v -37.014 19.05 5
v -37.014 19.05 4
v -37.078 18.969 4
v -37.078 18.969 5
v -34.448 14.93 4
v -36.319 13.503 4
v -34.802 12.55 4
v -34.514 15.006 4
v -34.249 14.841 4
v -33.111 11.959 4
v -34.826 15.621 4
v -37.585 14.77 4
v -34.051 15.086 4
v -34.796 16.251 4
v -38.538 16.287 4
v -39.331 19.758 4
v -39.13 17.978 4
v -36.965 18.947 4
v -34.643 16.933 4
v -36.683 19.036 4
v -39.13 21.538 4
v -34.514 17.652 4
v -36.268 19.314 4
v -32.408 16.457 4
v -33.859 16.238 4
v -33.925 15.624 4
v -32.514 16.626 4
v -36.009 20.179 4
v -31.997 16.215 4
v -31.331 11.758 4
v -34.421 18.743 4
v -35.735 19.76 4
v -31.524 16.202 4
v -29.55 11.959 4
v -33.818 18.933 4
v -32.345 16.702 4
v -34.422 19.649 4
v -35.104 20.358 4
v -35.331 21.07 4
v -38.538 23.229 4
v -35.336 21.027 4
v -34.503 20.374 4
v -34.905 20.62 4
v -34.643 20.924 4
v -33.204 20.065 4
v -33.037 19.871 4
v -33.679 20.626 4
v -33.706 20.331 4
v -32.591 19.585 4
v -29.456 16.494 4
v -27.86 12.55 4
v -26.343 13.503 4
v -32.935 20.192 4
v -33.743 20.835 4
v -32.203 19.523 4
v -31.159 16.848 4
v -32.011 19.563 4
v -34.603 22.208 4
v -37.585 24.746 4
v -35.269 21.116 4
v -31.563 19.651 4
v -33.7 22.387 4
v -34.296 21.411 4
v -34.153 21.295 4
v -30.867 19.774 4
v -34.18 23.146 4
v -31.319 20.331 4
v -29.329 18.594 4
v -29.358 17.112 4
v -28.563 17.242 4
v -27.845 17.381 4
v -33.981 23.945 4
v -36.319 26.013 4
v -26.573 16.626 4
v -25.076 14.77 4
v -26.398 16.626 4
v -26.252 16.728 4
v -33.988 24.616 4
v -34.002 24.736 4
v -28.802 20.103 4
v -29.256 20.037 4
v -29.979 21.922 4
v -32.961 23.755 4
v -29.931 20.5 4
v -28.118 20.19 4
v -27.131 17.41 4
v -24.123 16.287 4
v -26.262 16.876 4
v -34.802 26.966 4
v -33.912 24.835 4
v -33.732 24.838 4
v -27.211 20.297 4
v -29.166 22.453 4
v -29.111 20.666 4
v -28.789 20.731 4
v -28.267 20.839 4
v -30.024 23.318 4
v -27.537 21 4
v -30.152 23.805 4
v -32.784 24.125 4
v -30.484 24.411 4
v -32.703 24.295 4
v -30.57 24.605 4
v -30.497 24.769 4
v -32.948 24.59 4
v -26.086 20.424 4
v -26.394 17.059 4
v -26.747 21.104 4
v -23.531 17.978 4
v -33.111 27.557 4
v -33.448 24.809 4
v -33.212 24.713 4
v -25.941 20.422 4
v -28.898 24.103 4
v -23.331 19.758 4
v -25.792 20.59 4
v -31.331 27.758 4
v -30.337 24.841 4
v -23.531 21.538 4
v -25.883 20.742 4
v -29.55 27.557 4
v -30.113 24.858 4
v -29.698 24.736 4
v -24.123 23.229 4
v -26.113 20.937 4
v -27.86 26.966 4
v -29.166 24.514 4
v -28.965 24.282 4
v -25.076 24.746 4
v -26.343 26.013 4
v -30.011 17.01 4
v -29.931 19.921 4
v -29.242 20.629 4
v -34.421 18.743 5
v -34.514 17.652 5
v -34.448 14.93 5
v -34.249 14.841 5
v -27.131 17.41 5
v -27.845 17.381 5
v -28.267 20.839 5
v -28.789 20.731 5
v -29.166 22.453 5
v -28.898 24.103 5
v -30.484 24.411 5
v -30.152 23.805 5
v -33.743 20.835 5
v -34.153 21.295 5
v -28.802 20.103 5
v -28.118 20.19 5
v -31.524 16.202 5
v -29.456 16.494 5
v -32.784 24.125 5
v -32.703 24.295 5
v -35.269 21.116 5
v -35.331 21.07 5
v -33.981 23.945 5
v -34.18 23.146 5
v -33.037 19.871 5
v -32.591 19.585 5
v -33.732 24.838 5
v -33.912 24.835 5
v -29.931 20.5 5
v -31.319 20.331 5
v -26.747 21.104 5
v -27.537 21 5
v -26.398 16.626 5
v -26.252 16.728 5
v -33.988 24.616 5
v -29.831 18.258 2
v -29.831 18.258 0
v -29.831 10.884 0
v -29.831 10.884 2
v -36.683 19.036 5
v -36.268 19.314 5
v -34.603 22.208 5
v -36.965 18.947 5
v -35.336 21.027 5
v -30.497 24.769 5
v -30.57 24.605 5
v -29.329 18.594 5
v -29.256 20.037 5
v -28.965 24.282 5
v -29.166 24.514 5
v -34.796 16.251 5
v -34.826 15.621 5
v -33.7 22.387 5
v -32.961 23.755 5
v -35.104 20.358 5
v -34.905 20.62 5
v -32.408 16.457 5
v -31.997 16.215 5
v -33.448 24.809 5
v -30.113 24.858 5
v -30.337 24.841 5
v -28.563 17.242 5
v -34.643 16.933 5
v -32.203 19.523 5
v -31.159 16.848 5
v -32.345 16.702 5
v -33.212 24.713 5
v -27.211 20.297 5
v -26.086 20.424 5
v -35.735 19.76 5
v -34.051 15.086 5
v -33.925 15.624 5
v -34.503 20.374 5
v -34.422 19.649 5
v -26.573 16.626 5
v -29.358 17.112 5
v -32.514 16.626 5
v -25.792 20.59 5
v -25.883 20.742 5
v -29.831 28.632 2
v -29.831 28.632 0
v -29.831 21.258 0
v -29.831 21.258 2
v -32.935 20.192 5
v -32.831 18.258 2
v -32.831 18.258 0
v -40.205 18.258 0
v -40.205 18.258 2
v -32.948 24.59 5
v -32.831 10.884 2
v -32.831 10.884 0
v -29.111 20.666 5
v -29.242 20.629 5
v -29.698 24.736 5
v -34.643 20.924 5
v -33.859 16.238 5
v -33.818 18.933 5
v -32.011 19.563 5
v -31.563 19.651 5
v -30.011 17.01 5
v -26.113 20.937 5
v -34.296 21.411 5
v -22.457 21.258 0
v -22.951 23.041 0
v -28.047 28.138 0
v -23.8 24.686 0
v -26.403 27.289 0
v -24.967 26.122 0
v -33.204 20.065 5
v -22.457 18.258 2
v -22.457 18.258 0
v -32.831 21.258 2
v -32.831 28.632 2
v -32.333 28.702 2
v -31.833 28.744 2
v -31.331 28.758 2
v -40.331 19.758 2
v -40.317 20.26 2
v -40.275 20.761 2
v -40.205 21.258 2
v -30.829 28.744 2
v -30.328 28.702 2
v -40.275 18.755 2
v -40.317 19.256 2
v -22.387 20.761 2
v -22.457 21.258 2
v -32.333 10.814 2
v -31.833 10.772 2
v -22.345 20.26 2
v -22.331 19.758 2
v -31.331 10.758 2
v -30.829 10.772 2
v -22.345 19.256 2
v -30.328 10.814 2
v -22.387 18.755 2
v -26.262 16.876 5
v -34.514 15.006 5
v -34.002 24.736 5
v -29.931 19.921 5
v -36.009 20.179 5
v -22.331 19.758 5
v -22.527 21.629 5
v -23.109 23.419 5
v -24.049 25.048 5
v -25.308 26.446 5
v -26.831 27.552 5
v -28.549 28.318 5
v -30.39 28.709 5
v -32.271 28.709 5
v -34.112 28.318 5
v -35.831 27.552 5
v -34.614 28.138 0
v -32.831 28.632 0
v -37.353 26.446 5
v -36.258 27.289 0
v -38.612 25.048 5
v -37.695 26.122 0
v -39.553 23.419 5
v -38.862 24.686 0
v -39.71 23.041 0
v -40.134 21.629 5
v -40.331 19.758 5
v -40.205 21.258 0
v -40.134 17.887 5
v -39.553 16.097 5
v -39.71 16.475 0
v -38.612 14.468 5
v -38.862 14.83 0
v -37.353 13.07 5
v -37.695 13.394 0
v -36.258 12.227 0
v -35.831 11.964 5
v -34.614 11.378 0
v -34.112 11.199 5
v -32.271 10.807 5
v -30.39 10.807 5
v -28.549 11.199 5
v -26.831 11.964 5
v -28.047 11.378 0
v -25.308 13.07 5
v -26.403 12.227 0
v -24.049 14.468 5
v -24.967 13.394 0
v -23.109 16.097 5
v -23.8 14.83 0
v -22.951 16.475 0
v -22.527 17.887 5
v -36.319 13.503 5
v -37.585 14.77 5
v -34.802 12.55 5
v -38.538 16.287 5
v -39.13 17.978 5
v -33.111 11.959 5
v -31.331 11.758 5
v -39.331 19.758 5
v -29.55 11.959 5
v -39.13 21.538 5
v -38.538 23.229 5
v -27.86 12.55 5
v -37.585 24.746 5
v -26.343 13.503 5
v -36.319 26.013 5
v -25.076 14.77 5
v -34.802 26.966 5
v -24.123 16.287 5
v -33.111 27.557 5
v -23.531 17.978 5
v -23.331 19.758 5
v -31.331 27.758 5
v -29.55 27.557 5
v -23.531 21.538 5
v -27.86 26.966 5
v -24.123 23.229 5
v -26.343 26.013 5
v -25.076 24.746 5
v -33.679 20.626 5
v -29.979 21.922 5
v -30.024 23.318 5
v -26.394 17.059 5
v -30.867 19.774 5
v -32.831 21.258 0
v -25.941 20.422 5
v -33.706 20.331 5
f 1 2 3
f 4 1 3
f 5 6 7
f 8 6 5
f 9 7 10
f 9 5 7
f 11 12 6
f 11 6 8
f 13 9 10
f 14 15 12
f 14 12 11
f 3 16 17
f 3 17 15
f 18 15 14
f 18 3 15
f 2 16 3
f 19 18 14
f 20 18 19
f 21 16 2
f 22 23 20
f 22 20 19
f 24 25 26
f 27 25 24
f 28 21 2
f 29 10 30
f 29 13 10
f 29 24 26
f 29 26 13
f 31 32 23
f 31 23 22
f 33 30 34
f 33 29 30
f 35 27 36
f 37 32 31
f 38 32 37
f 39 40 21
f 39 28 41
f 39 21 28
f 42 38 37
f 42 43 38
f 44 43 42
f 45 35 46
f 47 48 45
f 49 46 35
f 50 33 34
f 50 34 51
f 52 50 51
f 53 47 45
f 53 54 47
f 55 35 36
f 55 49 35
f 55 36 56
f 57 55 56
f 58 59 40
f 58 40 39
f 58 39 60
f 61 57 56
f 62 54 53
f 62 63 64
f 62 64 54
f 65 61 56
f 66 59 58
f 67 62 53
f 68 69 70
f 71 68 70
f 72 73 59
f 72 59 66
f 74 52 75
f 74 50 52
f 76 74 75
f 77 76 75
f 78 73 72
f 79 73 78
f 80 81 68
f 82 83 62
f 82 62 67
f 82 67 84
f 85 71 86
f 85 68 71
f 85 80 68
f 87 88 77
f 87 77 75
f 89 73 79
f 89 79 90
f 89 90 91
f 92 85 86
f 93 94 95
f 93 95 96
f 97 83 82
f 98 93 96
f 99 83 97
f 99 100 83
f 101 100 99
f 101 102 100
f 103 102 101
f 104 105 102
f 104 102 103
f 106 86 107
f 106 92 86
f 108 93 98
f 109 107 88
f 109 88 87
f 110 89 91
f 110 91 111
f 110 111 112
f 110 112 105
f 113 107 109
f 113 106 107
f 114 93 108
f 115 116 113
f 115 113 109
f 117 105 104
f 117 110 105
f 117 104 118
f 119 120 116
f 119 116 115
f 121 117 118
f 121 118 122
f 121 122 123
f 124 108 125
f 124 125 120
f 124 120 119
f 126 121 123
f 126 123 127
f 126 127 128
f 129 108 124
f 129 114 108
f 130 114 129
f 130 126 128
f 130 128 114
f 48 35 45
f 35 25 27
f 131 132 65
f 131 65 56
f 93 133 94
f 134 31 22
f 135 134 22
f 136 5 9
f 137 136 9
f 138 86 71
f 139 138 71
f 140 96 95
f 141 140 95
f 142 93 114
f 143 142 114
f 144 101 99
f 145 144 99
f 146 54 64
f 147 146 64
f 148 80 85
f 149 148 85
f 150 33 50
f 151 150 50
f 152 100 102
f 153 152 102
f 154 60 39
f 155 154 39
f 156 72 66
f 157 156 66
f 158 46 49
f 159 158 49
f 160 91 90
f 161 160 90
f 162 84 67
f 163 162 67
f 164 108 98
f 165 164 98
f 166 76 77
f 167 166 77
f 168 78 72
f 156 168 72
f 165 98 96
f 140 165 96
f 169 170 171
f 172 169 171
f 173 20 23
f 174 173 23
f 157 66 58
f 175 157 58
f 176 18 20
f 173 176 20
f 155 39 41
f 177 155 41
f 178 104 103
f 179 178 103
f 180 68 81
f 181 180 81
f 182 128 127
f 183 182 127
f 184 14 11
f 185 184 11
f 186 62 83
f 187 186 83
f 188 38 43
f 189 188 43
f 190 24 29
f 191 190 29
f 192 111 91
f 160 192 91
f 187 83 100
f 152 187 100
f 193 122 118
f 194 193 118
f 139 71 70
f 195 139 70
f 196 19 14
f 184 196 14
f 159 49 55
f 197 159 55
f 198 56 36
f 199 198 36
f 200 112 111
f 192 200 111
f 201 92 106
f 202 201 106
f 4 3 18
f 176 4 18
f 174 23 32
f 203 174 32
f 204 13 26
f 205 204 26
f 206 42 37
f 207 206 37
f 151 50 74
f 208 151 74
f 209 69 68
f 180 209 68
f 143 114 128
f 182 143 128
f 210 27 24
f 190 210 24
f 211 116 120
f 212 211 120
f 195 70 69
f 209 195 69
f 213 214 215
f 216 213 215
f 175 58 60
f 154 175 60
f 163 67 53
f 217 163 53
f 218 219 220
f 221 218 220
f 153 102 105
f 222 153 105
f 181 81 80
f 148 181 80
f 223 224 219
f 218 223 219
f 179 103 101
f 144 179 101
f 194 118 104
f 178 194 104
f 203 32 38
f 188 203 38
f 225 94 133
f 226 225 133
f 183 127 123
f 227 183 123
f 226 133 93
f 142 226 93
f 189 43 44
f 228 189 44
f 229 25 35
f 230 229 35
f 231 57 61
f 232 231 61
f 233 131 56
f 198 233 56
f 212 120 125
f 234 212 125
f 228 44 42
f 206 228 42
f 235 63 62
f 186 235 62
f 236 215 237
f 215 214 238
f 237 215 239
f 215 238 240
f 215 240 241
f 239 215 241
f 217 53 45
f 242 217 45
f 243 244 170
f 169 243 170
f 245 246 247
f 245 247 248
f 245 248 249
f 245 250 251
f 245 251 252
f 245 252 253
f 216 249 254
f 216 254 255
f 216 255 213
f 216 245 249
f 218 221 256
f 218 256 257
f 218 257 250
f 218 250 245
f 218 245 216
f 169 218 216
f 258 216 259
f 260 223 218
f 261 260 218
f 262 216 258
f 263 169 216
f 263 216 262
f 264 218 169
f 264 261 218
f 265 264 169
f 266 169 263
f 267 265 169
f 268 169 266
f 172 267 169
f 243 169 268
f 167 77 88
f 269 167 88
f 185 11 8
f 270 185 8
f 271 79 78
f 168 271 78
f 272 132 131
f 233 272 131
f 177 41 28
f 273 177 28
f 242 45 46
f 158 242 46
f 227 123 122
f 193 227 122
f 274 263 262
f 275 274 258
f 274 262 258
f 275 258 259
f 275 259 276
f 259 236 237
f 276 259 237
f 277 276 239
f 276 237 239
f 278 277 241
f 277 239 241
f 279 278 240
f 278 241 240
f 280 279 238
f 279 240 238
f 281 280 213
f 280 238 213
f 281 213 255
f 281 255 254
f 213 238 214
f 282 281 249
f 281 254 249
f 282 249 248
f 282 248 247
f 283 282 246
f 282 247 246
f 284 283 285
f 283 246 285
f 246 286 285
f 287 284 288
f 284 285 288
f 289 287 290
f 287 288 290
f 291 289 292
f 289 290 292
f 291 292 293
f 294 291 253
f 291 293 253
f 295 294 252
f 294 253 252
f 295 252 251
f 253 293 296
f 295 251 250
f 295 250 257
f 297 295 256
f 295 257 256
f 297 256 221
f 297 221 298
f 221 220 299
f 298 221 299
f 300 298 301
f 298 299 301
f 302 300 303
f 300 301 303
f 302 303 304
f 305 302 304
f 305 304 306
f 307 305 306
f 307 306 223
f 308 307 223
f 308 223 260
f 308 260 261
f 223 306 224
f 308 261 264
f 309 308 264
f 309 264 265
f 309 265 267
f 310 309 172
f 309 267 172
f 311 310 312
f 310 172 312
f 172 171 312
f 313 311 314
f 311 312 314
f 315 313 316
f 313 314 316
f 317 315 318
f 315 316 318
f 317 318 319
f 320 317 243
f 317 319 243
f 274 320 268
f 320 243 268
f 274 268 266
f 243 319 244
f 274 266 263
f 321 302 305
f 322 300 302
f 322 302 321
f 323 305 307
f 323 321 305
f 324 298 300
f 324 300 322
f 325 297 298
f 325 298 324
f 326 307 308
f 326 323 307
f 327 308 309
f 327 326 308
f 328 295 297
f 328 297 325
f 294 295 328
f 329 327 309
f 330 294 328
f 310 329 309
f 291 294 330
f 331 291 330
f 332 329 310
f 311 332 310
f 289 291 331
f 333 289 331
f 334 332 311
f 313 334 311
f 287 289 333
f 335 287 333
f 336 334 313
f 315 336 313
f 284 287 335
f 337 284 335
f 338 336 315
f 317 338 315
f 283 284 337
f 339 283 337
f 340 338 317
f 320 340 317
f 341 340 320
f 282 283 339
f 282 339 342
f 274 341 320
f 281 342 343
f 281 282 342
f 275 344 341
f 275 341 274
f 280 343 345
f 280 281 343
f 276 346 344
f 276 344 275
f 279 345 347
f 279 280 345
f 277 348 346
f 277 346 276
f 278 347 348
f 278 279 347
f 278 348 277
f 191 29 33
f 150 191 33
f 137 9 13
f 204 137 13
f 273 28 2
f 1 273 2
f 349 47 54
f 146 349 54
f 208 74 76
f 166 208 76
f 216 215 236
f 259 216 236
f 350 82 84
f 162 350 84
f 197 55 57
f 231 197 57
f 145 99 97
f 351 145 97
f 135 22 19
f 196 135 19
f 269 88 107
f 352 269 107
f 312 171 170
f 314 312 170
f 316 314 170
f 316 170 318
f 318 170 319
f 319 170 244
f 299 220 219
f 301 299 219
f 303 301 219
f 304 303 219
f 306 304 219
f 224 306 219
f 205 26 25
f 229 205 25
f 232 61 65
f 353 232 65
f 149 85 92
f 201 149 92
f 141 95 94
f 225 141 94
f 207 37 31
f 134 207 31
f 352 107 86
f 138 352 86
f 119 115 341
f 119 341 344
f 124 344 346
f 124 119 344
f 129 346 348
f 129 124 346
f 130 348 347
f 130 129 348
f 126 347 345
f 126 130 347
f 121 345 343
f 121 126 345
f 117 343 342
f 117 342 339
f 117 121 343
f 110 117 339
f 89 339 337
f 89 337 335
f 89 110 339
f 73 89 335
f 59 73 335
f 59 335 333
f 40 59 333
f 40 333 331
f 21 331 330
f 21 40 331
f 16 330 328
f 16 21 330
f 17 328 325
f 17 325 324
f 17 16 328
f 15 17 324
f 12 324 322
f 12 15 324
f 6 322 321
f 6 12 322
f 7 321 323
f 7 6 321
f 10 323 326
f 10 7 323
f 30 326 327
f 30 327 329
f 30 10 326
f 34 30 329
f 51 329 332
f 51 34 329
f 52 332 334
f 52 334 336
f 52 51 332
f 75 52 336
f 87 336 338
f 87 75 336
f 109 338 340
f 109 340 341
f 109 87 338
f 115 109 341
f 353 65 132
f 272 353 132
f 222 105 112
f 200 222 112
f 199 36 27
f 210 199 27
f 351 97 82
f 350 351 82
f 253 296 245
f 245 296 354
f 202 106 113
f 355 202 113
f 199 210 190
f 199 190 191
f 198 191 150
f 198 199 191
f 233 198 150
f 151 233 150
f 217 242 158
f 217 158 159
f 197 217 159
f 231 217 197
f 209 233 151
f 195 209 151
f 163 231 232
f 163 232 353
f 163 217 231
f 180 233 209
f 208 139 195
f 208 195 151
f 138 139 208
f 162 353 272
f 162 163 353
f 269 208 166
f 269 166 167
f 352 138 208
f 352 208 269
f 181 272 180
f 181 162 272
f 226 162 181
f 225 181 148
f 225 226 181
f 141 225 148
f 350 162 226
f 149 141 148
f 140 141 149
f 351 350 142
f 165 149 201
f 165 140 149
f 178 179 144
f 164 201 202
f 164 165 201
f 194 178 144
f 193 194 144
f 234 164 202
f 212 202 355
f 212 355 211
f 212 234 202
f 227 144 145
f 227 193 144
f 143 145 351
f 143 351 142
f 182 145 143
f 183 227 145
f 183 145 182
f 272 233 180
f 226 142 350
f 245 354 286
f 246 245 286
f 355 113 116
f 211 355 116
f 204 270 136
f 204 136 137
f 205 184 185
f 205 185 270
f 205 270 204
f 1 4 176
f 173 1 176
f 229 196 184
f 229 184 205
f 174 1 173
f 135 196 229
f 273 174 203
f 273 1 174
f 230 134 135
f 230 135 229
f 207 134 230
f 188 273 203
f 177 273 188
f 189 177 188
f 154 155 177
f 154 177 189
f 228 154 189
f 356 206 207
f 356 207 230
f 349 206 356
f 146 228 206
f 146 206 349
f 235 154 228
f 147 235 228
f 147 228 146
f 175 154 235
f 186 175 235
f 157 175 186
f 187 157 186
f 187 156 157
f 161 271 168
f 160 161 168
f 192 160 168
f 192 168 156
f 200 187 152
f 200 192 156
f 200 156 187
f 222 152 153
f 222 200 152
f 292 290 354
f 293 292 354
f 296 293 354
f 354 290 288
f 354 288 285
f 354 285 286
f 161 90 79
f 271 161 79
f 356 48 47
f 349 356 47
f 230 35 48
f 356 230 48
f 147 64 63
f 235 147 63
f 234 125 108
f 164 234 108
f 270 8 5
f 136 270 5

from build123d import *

# Parameters (mm, degrees)
F0_R     = 9
F1_DEPTH = 4
F3_W     = 3
F3_H     = 3
F4_DEPTH = 2
F2_R     = 9
F2_R_2   = 8
F5_DEPTH = 1
F7_DEPTH = 1


# Not quite as in the source:
# - a feature names something its author has since deleted; it is built from what else it names


with BuildPart() as f1:
    # F0 (on Top) → F1 (new body)
    with BuildSketch(Plane.XY):
        with Locations((-31.3306450844, 19.7580661625)):
            Circle(F0_R)
    extrude(amount=F1_DEPTH)

    # F3 (on face) → F4 (cut)
    with BuildSketch(Plane(origin=(0, 0, 0), x_dir=(1, 0, 0), z_dir=(0, 0, -1))):
        with BuildLine():
            ThreePointArc((-32.8306450844, -28.6321858371), (-32.0832814269, -28.7265408676), (-31.3306450844, -28.7580661625))
            ThreePointArc((-31.3306450844, -28.7580661625), (-30.5780087419, -28.7265408676), (-29.8306450844, -28.6321858371))
            Line((-29.8306450844, -28.6321858371), (-29.8306450844, -21.2580661625))
            Line((-29.8306450844, -21.2580661625), (-32.8306450844, -21.2580661625))
            Line((-32.8306450844, -21.2580661625), (-32.8306450844, -28.6321858371))
        make_face()
        with BuildLine():
            ThreePointArc((-40.204764759, -18.2580661625), (-40.2991197895, -19.0054298199), (-40.3306450844, -19.7580661625))
            ThreePointArc((-40.3306450844, -19.7580661625), (-40.2991197895, -20.510702505), (-40.204764759, -21.2580661625))
            Line((-40.204764759, -21.2580661625), (-32.8306450844, -21.2580661625))
            Line((-32.8306450844, -21.2580661625), (-32.8306450844, -18.2580661625))
            Line((-32.8306450844, -18.2580661625), (-40.204764759, -18.2580661625))
        make_face()
        with Locations((-31.3306450844, -19.7580661625)):
            Rectangle(F3_W, F3_H)
        with BuildLine():
            Line((-29.8306450844, -18.2580661625), (-29.8306450844, -21.2580661625))
            Line((-29.8306450844, -21.2580661625), (-22.4565254097, -21.2580661625))
            ThreePointArc((-22.4565254097, -21.2580661625), (-22.3621703793, -20.510702505), (-22.3306450844, -19.7580661625))
            ThreePointArc((-22.3306450844, -19.7580661625), (-22.3621703793, -19.0054298199), (-22.4565254097, -18.2580661625))
            Line((-22.4565254097, -18.2580661625), (-29.8306450844, -18.2580661625))
        make_face()
        with BuildLine():
            Line((-32.8306450844, -10.8839464878), (-32.8306450844, -18.2580661625))
            Line((-32.8306450844, -18.2580661625), (-29.8306450844, -18.2580661625))
            Line((-29.8306450844, -18.2580661625), (-29.8306450844, -10.8839464878))
            ThreePointArc((-29.8306450844, -10.8839464878), (-30.5780087419, -10.7895914574), (-31.3306450844, -10.7580661625))
            ThreePointArc((-31.3306450844, -10.7580661625), (-32.0832814269, -10.7895914574), (-32.8306450844, -10.8839464878))
        make_face()
    extrude(amount=-F4_DEPTH, mode=Mode.SUBTRACT)

    # F2 (on face) → F5 (join)
    with BuildSketch(Plane.XY.offset(4)):
        with Locations((-31.3306450844, 19.7580661625)):
            Circle(F2_R)
        with Locations((-31.3306450844, 19.7580661625)):
            Circle(F2_R_2, mode=Mode.SUBTRACT)
    extrude(amount=F5_DEPTH)

    # F6 (on face) → F7 (join)
    with BuildSketch(Plane.XY.offset(4)):
        Polygon((-34.9050166448, 20.6202120843), (-34.6433972716, 20.9240779367), (-34.5026717981, 20.3743209936), (-34.4223662395, 19.6491017819), (-34.4207141089, 18.7433737938), (-34.5142607427, 17.652222692), (-34.6425682025, 16.9327949487), (-34.7957417285, 16.2514322926), (-34.8255401553, 15.620582776), (-34.5142607427, 15.0062852041), (-34.4480313361, 14.930120185), (-34.2493371085, 14.8407080829), (-34.0506428809, 15.0857628952), (-33.9247925897, 15.6238930448), (-33.8585631831, 16.2381852097), (-33.8179988731, 18.9329782997), (-33.7062427572, 20.331275484), (-33.6789195223, 20.6260155682), (-33.7426497061, 20.8346225789), (-34.1532852441, 21.2949361796), (-34.2956868792, 21.4108256257), (-33.6996102042, 22.3869043351), (-32.9611258864, 23.7554691778), (-32.7839634252, 24.124705329), (-32.7028348052, 24.2952051983), (-32.9478788035, 24.5899452825), (-33.2119733685, 24.7132843353), (-33.4479276451, 24.8085071305), (-33.7319078538, 24.8383055573), (-33.9115455069, 24.8350012963), (-34.0017938873, 24.7356331554), (-33.9877177353, 24.6164394483), (-33.9810851823, 23.9450136062), (-34.1797794099, 23.1461033657), (-34.6028329616, 22.2081137744), (-35.2692903966, 21.1160855415), (-35.3305513962, 21.0697658095), (-35.3355198033, 21.0266902611), (-36.0085977758, 20.1789490503), (-37.0144827221, 19.0496908072), (-37.0782297275, 18.9685621872), (-36.9648088648, 18.947048444), (-36.6833260766, 19.0364677553), (-36.2677239339, 19.31379138), (-35.7353954658, 19.7600288287), (-35.1037108724, 20.357763642), align=None)
        Polygon((-29.9310764641, 19.9206399459), (-30.0105589614, 17.0097722153), (-31.1588076939, 16.8475089676), (-32.3451815909, 16.7018030715), (-32.5140773917, 16.6256428585), (-32.4081067365, 16.4567530655), (-31.9974772062, 16.2150073205), (-31.5239165226, 16.2017602376), (-29.45586365, 16.4940071067), (-26.5731061692, 16.6256428585), (-26.3976198696, 16.6256428585), (-26.2519319967, 16.7282972372), (-26.2618447798, 16.8756552638), (-26.3943156085, 17.059450278), (-27.1311057416, 17.4096598934), (-27.8447660474, 17.3806665048), (-28.563352706, 17.2415931617), (-29.3581176009, 17.1124326018), (-29.3291602587, 18.5935345676), (-29.2555052764, 20.0365474153), (-28.8018001977, 20.1027828296), (-28.1179983962, 20.1897209413), (-27.2114293234, 20.297343727), (-26.0862984027, 20.4239990563), (-25.9414516145, 20.4223409181), (-25.791618396, 20.5895845884), (-25.8826958455, 20.7419230375), (-26.1127925684, 20.9372949808), (-26.746970377, 21.103709582), (-27.5368089191, 21.0001960954), (-28.2669905301, 20.8387679245), (-28.7885831536, 20.731139131), (-29.1114394953, 20.6657327858), (-29.2422281548, 20.629325837), (-29.1661099961, 22.4531697882), (-28.8978640776, 24.103137516), (-28.9649105379, 24.2819881542), (-29.1661099961, 24.5137670463), (-29.6983964099, 24.7356331554), (-30.1131712858, 24.858191201), (-30.3367195641, 24.8408288112), (-30.4973066504, 24.7687959206), (-30.5701806256, 24.6048444959), (-30.4840896063, 24.4110946444), (-30.1521014886, 23.8050931708), (-30.0237760055, 23.3182854043), (-29.9790783653, 21.9216643815), (-29.9310764641, 20.500165277), (-31.318589742, 20.331275484), (-32.9346317206, 20.1921961332), (-33.203712716, 20.0646937115), (-33.0372981148, 19.8709618832), (-32.5910546583, 19.5845245058), (-32.2027799559, 19.5232514908), (-32.0107242891, 19.5629927394), (-31.5628287021, 19.6507539124), (-30.8673838862, 19.7741049807), align=None)
    extrude(amount=F7_DEPTH)


solid = f1.part
